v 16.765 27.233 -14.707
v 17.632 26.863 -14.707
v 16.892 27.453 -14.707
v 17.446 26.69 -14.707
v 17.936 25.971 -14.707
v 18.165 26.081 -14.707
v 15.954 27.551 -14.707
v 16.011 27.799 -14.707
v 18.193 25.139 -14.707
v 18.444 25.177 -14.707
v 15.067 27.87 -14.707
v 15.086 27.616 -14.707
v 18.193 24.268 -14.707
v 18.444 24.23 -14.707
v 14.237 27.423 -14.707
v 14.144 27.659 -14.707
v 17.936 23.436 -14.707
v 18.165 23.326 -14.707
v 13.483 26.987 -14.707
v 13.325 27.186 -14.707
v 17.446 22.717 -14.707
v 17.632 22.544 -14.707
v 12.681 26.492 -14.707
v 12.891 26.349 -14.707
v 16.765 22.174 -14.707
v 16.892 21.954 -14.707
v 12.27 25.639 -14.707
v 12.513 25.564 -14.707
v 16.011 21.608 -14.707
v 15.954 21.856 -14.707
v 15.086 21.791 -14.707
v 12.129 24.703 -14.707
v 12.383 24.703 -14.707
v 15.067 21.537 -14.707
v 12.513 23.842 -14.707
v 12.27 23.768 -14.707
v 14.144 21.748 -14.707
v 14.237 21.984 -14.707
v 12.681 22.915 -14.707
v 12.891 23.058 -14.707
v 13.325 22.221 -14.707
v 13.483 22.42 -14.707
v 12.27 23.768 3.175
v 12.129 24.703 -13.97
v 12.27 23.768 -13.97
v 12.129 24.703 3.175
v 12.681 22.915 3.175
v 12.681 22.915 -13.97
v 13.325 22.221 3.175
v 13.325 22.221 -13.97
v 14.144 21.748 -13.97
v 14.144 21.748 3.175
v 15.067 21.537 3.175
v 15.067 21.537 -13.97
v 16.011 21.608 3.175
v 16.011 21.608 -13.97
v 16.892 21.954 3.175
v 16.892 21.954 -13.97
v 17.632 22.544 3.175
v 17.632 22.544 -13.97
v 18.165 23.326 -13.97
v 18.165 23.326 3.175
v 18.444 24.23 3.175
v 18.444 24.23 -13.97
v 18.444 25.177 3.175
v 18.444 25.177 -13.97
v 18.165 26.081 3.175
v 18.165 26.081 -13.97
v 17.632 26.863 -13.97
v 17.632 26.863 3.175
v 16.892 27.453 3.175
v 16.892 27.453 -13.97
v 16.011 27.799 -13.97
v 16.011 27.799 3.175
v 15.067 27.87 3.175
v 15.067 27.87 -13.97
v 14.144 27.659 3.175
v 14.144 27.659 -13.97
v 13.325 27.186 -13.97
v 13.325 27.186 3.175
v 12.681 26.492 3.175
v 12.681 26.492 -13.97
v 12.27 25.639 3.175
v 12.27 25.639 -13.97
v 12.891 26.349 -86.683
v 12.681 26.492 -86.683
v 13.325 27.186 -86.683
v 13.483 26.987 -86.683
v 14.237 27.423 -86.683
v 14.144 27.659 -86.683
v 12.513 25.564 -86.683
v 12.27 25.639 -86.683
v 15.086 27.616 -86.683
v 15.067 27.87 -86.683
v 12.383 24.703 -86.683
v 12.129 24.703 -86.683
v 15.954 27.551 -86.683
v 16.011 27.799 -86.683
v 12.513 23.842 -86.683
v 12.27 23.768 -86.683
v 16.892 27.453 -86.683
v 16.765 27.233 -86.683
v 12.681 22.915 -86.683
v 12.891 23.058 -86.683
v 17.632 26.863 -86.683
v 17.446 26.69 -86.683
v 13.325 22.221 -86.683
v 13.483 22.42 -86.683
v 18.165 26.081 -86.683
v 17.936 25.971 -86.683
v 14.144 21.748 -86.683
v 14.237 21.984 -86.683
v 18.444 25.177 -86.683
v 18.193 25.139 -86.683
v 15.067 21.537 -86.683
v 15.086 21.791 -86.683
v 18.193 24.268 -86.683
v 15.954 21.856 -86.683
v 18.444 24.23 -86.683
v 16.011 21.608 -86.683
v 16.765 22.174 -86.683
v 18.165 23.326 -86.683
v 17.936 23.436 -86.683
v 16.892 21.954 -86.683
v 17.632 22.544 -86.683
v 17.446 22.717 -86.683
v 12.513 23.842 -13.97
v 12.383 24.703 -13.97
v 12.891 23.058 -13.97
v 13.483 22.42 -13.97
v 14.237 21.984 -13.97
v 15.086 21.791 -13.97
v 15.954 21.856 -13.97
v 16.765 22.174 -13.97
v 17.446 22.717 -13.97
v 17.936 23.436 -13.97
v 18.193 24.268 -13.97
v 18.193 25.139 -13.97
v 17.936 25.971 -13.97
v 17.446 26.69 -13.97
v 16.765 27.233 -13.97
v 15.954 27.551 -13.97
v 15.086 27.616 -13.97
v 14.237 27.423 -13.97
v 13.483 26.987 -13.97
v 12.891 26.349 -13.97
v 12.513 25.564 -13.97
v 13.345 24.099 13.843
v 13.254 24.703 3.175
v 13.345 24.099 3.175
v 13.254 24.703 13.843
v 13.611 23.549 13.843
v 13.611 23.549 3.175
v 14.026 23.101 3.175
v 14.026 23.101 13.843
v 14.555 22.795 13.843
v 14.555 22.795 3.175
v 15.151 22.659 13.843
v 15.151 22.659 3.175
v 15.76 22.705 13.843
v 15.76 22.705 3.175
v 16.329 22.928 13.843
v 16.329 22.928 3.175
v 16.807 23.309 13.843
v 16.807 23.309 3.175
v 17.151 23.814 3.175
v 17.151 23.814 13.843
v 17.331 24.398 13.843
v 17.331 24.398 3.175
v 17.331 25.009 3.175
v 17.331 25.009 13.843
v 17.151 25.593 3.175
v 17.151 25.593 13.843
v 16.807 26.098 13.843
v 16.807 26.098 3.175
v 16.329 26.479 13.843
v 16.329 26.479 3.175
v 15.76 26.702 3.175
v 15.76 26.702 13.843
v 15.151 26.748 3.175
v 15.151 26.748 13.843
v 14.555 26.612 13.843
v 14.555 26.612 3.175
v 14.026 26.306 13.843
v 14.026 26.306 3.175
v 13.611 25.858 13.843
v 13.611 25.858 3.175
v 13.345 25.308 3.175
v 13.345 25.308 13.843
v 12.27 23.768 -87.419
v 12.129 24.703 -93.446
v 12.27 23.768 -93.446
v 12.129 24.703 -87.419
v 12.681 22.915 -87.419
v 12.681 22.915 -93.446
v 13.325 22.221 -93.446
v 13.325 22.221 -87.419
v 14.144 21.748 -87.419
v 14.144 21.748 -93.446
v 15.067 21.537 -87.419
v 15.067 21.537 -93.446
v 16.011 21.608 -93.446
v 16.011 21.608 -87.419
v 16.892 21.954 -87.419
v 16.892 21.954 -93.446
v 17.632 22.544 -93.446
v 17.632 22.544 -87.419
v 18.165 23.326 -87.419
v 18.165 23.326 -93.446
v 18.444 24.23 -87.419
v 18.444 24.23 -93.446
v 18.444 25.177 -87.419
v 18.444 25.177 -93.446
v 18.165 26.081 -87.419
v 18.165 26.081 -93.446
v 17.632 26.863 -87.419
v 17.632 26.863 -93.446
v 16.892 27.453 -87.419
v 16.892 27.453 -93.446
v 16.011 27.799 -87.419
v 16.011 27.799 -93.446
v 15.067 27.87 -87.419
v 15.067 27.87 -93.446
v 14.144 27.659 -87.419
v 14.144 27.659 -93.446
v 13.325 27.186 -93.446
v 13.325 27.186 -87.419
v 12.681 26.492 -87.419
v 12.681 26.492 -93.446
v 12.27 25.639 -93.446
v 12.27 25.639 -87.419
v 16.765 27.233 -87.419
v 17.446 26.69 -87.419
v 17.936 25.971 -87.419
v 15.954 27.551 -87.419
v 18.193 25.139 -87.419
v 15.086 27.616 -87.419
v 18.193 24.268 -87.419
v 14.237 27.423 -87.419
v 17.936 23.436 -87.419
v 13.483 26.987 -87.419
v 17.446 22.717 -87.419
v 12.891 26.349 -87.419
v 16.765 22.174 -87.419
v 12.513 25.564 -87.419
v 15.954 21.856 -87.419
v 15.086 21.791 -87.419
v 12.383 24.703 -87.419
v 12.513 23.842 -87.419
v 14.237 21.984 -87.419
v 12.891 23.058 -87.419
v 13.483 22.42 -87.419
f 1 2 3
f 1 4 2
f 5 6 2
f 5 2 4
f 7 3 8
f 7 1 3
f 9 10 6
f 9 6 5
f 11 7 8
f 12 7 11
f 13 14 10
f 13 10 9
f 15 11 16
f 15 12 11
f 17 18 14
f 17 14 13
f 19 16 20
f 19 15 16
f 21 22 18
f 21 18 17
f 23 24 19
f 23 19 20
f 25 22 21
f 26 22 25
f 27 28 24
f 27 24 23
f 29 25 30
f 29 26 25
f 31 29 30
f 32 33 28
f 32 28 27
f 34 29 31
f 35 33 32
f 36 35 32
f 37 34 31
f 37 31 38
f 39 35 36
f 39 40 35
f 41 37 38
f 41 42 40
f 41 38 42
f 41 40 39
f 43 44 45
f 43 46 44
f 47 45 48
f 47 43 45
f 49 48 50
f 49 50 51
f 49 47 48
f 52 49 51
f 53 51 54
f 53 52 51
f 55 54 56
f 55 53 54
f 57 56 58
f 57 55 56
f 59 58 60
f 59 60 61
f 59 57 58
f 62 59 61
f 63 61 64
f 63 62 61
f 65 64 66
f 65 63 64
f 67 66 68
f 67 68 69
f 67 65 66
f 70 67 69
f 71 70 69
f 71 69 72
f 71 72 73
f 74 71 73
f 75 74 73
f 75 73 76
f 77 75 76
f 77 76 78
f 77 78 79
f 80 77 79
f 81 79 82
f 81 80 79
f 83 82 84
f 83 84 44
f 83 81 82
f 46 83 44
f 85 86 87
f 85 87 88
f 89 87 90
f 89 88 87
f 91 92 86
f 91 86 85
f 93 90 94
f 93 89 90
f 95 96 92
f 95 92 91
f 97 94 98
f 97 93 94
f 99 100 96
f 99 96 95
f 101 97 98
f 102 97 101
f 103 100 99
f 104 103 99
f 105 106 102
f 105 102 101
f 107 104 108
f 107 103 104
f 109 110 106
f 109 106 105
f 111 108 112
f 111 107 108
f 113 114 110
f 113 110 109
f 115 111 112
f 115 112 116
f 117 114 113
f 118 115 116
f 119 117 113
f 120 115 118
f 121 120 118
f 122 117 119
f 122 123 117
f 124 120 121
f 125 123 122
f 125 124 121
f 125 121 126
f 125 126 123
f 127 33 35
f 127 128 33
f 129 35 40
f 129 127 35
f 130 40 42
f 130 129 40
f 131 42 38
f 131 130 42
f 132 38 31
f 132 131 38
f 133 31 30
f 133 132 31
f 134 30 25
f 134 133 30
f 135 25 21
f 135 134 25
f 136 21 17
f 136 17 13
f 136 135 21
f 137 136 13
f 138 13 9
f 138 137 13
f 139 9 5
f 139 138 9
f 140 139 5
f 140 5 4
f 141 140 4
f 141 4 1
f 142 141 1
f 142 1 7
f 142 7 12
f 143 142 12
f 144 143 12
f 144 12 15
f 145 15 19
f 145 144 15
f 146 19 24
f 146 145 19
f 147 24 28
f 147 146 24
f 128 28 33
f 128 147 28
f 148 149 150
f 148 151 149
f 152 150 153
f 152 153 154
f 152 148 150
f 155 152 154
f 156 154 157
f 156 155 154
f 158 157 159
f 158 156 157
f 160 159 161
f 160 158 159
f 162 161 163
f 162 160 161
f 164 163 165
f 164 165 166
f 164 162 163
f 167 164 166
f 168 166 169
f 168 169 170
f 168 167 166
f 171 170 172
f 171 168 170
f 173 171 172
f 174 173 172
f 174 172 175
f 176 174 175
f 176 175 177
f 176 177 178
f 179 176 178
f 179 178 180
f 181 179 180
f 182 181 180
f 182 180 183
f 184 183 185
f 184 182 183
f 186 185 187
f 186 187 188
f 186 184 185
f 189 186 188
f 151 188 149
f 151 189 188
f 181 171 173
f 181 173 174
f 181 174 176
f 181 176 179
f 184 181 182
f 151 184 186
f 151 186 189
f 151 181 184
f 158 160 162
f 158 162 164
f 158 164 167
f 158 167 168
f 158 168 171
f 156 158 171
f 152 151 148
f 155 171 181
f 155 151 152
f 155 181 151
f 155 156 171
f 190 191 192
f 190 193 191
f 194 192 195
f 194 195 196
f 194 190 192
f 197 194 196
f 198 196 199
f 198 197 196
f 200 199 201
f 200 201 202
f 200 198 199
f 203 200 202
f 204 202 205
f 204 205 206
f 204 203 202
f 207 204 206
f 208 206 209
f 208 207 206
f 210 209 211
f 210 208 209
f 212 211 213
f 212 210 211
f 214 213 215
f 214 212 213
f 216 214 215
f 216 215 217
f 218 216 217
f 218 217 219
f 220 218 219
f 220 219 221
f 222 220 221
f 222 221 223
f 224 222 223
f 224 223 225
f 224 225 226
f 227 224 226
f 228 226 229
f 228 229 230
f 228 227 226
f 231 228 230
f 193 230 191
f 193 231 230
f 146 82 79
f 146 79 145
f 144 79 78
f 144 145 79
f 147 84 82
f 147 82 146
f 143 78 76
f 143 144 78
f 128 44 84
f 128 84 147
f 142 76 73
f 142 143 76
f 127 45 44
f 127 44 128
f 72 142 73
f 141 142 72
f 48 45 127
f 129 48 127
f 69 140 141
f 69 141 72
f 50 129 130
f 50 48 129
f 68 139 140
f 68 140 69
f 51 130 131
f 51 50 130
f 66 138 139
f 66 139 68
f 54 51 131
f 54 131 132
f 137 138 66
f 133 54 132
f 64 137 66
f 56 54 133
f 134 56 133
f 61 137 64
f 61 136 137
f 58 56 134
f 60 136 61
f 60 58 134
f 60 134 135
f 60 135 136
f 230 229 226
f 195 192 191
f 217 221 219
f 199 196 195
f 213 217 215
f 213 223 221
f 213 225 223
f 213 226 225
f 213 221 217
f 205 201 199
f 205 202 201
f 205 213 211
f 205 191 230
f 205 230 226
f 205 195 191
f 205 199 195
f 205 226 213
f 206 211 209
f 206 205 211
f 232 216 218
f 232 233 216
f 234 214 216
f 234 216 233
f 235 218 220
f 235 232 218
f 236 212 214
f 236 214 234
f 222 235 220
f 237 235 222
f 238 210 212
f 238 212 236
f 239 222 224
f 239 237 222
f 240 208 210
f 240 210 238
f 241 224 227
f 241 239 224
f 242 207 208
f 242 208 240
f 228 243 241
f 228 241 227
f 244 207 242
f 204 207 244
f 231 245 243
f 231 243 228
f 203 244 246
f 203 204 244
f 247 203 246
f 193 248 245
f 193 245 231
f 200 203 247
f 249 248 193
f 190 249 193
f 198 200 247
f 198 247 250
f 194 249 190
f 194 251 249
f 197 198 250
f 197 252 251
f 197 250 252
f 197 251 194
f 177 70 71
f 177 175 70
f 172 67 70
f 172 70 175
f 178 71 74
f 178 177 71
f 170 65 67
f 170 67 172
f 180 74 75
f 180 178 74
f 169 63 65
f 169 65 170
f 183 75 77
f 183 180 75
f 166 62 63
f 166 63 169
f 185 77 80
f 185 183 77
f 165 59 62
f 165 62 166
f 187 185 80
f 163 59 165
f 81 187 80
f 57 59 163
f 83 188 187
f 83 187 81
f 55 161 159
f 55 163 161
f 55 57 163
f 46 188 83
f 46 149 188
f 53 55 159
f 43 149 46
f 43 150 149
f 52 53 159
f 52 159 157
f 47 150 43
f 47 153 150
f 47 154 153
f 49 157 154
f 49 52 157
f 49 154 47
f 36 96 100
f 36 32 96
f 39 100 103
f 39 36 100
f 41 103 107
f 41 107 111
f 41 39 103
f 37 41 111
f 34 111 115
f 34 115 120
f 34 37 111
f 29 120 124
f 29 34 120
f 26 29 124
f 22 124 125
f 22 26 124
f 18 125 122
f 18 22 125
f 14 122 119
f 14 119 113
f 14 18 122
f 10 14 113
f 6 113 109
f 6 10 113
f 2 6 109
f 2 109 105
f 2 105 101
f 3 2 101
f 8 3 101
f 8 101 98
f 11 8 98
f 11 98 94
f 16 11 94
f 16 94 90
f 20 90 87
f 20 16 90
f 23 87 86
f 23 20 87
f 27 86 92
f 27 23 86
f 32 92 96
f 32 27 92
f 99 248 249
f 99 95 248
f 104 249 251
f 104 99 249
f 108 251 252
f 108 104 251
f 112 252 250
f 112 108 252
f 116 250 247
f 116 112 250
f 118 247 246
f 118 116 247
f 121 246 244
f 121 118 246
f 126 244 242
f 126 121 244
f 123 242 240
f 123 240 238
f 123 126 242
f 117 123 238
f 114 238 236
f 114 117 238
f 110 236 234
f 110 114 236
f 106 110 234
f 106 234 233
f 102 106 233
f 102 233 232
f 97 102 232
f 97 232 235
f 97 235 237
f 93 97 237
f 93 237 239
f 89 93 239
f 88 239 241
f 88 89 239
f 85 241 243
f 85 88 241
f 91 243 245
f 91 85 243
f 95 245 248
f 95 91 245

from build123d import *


with BuildPart() as part:
    # Sketch1 → Revolve1 (revolve)
    with BuildSketch(Plane(origin=(15.304322218, 0, 0), x_dir=(0, 0, -1), z_dir=(1, 0, 0)), mode=Mode.PRIVATE) as revolve1_sk:
        Polygon((13.97, 27.878467802), (-3.175, 27.878467802), (-3.175, 26.753467802), (-13.843, 26.753467802), (-13.843, 24.703467802), (93.445553682, 24.703467802), (93.445553682, 27.878467802), (87.419403682, 27.878467802), (87.419403682, 27.624467802), (86.682803682, 27.624467802), (86.682803682, 27.878467802), (65.655613748, 27.878467802), (14.7066, 27.878467802), (14.7066, 27.624467802), (13.97, 27.624467802), align=None)
    revolve(revolve1_sk.sketch.rotate(Axis((15.304322218, 24.703467802, -93.445553682), (0, 0, 1)), 90), axis=Axis((15.304322218, 24.703467802, -93.445553682), (0, 0, 1)))


solid = part.part
